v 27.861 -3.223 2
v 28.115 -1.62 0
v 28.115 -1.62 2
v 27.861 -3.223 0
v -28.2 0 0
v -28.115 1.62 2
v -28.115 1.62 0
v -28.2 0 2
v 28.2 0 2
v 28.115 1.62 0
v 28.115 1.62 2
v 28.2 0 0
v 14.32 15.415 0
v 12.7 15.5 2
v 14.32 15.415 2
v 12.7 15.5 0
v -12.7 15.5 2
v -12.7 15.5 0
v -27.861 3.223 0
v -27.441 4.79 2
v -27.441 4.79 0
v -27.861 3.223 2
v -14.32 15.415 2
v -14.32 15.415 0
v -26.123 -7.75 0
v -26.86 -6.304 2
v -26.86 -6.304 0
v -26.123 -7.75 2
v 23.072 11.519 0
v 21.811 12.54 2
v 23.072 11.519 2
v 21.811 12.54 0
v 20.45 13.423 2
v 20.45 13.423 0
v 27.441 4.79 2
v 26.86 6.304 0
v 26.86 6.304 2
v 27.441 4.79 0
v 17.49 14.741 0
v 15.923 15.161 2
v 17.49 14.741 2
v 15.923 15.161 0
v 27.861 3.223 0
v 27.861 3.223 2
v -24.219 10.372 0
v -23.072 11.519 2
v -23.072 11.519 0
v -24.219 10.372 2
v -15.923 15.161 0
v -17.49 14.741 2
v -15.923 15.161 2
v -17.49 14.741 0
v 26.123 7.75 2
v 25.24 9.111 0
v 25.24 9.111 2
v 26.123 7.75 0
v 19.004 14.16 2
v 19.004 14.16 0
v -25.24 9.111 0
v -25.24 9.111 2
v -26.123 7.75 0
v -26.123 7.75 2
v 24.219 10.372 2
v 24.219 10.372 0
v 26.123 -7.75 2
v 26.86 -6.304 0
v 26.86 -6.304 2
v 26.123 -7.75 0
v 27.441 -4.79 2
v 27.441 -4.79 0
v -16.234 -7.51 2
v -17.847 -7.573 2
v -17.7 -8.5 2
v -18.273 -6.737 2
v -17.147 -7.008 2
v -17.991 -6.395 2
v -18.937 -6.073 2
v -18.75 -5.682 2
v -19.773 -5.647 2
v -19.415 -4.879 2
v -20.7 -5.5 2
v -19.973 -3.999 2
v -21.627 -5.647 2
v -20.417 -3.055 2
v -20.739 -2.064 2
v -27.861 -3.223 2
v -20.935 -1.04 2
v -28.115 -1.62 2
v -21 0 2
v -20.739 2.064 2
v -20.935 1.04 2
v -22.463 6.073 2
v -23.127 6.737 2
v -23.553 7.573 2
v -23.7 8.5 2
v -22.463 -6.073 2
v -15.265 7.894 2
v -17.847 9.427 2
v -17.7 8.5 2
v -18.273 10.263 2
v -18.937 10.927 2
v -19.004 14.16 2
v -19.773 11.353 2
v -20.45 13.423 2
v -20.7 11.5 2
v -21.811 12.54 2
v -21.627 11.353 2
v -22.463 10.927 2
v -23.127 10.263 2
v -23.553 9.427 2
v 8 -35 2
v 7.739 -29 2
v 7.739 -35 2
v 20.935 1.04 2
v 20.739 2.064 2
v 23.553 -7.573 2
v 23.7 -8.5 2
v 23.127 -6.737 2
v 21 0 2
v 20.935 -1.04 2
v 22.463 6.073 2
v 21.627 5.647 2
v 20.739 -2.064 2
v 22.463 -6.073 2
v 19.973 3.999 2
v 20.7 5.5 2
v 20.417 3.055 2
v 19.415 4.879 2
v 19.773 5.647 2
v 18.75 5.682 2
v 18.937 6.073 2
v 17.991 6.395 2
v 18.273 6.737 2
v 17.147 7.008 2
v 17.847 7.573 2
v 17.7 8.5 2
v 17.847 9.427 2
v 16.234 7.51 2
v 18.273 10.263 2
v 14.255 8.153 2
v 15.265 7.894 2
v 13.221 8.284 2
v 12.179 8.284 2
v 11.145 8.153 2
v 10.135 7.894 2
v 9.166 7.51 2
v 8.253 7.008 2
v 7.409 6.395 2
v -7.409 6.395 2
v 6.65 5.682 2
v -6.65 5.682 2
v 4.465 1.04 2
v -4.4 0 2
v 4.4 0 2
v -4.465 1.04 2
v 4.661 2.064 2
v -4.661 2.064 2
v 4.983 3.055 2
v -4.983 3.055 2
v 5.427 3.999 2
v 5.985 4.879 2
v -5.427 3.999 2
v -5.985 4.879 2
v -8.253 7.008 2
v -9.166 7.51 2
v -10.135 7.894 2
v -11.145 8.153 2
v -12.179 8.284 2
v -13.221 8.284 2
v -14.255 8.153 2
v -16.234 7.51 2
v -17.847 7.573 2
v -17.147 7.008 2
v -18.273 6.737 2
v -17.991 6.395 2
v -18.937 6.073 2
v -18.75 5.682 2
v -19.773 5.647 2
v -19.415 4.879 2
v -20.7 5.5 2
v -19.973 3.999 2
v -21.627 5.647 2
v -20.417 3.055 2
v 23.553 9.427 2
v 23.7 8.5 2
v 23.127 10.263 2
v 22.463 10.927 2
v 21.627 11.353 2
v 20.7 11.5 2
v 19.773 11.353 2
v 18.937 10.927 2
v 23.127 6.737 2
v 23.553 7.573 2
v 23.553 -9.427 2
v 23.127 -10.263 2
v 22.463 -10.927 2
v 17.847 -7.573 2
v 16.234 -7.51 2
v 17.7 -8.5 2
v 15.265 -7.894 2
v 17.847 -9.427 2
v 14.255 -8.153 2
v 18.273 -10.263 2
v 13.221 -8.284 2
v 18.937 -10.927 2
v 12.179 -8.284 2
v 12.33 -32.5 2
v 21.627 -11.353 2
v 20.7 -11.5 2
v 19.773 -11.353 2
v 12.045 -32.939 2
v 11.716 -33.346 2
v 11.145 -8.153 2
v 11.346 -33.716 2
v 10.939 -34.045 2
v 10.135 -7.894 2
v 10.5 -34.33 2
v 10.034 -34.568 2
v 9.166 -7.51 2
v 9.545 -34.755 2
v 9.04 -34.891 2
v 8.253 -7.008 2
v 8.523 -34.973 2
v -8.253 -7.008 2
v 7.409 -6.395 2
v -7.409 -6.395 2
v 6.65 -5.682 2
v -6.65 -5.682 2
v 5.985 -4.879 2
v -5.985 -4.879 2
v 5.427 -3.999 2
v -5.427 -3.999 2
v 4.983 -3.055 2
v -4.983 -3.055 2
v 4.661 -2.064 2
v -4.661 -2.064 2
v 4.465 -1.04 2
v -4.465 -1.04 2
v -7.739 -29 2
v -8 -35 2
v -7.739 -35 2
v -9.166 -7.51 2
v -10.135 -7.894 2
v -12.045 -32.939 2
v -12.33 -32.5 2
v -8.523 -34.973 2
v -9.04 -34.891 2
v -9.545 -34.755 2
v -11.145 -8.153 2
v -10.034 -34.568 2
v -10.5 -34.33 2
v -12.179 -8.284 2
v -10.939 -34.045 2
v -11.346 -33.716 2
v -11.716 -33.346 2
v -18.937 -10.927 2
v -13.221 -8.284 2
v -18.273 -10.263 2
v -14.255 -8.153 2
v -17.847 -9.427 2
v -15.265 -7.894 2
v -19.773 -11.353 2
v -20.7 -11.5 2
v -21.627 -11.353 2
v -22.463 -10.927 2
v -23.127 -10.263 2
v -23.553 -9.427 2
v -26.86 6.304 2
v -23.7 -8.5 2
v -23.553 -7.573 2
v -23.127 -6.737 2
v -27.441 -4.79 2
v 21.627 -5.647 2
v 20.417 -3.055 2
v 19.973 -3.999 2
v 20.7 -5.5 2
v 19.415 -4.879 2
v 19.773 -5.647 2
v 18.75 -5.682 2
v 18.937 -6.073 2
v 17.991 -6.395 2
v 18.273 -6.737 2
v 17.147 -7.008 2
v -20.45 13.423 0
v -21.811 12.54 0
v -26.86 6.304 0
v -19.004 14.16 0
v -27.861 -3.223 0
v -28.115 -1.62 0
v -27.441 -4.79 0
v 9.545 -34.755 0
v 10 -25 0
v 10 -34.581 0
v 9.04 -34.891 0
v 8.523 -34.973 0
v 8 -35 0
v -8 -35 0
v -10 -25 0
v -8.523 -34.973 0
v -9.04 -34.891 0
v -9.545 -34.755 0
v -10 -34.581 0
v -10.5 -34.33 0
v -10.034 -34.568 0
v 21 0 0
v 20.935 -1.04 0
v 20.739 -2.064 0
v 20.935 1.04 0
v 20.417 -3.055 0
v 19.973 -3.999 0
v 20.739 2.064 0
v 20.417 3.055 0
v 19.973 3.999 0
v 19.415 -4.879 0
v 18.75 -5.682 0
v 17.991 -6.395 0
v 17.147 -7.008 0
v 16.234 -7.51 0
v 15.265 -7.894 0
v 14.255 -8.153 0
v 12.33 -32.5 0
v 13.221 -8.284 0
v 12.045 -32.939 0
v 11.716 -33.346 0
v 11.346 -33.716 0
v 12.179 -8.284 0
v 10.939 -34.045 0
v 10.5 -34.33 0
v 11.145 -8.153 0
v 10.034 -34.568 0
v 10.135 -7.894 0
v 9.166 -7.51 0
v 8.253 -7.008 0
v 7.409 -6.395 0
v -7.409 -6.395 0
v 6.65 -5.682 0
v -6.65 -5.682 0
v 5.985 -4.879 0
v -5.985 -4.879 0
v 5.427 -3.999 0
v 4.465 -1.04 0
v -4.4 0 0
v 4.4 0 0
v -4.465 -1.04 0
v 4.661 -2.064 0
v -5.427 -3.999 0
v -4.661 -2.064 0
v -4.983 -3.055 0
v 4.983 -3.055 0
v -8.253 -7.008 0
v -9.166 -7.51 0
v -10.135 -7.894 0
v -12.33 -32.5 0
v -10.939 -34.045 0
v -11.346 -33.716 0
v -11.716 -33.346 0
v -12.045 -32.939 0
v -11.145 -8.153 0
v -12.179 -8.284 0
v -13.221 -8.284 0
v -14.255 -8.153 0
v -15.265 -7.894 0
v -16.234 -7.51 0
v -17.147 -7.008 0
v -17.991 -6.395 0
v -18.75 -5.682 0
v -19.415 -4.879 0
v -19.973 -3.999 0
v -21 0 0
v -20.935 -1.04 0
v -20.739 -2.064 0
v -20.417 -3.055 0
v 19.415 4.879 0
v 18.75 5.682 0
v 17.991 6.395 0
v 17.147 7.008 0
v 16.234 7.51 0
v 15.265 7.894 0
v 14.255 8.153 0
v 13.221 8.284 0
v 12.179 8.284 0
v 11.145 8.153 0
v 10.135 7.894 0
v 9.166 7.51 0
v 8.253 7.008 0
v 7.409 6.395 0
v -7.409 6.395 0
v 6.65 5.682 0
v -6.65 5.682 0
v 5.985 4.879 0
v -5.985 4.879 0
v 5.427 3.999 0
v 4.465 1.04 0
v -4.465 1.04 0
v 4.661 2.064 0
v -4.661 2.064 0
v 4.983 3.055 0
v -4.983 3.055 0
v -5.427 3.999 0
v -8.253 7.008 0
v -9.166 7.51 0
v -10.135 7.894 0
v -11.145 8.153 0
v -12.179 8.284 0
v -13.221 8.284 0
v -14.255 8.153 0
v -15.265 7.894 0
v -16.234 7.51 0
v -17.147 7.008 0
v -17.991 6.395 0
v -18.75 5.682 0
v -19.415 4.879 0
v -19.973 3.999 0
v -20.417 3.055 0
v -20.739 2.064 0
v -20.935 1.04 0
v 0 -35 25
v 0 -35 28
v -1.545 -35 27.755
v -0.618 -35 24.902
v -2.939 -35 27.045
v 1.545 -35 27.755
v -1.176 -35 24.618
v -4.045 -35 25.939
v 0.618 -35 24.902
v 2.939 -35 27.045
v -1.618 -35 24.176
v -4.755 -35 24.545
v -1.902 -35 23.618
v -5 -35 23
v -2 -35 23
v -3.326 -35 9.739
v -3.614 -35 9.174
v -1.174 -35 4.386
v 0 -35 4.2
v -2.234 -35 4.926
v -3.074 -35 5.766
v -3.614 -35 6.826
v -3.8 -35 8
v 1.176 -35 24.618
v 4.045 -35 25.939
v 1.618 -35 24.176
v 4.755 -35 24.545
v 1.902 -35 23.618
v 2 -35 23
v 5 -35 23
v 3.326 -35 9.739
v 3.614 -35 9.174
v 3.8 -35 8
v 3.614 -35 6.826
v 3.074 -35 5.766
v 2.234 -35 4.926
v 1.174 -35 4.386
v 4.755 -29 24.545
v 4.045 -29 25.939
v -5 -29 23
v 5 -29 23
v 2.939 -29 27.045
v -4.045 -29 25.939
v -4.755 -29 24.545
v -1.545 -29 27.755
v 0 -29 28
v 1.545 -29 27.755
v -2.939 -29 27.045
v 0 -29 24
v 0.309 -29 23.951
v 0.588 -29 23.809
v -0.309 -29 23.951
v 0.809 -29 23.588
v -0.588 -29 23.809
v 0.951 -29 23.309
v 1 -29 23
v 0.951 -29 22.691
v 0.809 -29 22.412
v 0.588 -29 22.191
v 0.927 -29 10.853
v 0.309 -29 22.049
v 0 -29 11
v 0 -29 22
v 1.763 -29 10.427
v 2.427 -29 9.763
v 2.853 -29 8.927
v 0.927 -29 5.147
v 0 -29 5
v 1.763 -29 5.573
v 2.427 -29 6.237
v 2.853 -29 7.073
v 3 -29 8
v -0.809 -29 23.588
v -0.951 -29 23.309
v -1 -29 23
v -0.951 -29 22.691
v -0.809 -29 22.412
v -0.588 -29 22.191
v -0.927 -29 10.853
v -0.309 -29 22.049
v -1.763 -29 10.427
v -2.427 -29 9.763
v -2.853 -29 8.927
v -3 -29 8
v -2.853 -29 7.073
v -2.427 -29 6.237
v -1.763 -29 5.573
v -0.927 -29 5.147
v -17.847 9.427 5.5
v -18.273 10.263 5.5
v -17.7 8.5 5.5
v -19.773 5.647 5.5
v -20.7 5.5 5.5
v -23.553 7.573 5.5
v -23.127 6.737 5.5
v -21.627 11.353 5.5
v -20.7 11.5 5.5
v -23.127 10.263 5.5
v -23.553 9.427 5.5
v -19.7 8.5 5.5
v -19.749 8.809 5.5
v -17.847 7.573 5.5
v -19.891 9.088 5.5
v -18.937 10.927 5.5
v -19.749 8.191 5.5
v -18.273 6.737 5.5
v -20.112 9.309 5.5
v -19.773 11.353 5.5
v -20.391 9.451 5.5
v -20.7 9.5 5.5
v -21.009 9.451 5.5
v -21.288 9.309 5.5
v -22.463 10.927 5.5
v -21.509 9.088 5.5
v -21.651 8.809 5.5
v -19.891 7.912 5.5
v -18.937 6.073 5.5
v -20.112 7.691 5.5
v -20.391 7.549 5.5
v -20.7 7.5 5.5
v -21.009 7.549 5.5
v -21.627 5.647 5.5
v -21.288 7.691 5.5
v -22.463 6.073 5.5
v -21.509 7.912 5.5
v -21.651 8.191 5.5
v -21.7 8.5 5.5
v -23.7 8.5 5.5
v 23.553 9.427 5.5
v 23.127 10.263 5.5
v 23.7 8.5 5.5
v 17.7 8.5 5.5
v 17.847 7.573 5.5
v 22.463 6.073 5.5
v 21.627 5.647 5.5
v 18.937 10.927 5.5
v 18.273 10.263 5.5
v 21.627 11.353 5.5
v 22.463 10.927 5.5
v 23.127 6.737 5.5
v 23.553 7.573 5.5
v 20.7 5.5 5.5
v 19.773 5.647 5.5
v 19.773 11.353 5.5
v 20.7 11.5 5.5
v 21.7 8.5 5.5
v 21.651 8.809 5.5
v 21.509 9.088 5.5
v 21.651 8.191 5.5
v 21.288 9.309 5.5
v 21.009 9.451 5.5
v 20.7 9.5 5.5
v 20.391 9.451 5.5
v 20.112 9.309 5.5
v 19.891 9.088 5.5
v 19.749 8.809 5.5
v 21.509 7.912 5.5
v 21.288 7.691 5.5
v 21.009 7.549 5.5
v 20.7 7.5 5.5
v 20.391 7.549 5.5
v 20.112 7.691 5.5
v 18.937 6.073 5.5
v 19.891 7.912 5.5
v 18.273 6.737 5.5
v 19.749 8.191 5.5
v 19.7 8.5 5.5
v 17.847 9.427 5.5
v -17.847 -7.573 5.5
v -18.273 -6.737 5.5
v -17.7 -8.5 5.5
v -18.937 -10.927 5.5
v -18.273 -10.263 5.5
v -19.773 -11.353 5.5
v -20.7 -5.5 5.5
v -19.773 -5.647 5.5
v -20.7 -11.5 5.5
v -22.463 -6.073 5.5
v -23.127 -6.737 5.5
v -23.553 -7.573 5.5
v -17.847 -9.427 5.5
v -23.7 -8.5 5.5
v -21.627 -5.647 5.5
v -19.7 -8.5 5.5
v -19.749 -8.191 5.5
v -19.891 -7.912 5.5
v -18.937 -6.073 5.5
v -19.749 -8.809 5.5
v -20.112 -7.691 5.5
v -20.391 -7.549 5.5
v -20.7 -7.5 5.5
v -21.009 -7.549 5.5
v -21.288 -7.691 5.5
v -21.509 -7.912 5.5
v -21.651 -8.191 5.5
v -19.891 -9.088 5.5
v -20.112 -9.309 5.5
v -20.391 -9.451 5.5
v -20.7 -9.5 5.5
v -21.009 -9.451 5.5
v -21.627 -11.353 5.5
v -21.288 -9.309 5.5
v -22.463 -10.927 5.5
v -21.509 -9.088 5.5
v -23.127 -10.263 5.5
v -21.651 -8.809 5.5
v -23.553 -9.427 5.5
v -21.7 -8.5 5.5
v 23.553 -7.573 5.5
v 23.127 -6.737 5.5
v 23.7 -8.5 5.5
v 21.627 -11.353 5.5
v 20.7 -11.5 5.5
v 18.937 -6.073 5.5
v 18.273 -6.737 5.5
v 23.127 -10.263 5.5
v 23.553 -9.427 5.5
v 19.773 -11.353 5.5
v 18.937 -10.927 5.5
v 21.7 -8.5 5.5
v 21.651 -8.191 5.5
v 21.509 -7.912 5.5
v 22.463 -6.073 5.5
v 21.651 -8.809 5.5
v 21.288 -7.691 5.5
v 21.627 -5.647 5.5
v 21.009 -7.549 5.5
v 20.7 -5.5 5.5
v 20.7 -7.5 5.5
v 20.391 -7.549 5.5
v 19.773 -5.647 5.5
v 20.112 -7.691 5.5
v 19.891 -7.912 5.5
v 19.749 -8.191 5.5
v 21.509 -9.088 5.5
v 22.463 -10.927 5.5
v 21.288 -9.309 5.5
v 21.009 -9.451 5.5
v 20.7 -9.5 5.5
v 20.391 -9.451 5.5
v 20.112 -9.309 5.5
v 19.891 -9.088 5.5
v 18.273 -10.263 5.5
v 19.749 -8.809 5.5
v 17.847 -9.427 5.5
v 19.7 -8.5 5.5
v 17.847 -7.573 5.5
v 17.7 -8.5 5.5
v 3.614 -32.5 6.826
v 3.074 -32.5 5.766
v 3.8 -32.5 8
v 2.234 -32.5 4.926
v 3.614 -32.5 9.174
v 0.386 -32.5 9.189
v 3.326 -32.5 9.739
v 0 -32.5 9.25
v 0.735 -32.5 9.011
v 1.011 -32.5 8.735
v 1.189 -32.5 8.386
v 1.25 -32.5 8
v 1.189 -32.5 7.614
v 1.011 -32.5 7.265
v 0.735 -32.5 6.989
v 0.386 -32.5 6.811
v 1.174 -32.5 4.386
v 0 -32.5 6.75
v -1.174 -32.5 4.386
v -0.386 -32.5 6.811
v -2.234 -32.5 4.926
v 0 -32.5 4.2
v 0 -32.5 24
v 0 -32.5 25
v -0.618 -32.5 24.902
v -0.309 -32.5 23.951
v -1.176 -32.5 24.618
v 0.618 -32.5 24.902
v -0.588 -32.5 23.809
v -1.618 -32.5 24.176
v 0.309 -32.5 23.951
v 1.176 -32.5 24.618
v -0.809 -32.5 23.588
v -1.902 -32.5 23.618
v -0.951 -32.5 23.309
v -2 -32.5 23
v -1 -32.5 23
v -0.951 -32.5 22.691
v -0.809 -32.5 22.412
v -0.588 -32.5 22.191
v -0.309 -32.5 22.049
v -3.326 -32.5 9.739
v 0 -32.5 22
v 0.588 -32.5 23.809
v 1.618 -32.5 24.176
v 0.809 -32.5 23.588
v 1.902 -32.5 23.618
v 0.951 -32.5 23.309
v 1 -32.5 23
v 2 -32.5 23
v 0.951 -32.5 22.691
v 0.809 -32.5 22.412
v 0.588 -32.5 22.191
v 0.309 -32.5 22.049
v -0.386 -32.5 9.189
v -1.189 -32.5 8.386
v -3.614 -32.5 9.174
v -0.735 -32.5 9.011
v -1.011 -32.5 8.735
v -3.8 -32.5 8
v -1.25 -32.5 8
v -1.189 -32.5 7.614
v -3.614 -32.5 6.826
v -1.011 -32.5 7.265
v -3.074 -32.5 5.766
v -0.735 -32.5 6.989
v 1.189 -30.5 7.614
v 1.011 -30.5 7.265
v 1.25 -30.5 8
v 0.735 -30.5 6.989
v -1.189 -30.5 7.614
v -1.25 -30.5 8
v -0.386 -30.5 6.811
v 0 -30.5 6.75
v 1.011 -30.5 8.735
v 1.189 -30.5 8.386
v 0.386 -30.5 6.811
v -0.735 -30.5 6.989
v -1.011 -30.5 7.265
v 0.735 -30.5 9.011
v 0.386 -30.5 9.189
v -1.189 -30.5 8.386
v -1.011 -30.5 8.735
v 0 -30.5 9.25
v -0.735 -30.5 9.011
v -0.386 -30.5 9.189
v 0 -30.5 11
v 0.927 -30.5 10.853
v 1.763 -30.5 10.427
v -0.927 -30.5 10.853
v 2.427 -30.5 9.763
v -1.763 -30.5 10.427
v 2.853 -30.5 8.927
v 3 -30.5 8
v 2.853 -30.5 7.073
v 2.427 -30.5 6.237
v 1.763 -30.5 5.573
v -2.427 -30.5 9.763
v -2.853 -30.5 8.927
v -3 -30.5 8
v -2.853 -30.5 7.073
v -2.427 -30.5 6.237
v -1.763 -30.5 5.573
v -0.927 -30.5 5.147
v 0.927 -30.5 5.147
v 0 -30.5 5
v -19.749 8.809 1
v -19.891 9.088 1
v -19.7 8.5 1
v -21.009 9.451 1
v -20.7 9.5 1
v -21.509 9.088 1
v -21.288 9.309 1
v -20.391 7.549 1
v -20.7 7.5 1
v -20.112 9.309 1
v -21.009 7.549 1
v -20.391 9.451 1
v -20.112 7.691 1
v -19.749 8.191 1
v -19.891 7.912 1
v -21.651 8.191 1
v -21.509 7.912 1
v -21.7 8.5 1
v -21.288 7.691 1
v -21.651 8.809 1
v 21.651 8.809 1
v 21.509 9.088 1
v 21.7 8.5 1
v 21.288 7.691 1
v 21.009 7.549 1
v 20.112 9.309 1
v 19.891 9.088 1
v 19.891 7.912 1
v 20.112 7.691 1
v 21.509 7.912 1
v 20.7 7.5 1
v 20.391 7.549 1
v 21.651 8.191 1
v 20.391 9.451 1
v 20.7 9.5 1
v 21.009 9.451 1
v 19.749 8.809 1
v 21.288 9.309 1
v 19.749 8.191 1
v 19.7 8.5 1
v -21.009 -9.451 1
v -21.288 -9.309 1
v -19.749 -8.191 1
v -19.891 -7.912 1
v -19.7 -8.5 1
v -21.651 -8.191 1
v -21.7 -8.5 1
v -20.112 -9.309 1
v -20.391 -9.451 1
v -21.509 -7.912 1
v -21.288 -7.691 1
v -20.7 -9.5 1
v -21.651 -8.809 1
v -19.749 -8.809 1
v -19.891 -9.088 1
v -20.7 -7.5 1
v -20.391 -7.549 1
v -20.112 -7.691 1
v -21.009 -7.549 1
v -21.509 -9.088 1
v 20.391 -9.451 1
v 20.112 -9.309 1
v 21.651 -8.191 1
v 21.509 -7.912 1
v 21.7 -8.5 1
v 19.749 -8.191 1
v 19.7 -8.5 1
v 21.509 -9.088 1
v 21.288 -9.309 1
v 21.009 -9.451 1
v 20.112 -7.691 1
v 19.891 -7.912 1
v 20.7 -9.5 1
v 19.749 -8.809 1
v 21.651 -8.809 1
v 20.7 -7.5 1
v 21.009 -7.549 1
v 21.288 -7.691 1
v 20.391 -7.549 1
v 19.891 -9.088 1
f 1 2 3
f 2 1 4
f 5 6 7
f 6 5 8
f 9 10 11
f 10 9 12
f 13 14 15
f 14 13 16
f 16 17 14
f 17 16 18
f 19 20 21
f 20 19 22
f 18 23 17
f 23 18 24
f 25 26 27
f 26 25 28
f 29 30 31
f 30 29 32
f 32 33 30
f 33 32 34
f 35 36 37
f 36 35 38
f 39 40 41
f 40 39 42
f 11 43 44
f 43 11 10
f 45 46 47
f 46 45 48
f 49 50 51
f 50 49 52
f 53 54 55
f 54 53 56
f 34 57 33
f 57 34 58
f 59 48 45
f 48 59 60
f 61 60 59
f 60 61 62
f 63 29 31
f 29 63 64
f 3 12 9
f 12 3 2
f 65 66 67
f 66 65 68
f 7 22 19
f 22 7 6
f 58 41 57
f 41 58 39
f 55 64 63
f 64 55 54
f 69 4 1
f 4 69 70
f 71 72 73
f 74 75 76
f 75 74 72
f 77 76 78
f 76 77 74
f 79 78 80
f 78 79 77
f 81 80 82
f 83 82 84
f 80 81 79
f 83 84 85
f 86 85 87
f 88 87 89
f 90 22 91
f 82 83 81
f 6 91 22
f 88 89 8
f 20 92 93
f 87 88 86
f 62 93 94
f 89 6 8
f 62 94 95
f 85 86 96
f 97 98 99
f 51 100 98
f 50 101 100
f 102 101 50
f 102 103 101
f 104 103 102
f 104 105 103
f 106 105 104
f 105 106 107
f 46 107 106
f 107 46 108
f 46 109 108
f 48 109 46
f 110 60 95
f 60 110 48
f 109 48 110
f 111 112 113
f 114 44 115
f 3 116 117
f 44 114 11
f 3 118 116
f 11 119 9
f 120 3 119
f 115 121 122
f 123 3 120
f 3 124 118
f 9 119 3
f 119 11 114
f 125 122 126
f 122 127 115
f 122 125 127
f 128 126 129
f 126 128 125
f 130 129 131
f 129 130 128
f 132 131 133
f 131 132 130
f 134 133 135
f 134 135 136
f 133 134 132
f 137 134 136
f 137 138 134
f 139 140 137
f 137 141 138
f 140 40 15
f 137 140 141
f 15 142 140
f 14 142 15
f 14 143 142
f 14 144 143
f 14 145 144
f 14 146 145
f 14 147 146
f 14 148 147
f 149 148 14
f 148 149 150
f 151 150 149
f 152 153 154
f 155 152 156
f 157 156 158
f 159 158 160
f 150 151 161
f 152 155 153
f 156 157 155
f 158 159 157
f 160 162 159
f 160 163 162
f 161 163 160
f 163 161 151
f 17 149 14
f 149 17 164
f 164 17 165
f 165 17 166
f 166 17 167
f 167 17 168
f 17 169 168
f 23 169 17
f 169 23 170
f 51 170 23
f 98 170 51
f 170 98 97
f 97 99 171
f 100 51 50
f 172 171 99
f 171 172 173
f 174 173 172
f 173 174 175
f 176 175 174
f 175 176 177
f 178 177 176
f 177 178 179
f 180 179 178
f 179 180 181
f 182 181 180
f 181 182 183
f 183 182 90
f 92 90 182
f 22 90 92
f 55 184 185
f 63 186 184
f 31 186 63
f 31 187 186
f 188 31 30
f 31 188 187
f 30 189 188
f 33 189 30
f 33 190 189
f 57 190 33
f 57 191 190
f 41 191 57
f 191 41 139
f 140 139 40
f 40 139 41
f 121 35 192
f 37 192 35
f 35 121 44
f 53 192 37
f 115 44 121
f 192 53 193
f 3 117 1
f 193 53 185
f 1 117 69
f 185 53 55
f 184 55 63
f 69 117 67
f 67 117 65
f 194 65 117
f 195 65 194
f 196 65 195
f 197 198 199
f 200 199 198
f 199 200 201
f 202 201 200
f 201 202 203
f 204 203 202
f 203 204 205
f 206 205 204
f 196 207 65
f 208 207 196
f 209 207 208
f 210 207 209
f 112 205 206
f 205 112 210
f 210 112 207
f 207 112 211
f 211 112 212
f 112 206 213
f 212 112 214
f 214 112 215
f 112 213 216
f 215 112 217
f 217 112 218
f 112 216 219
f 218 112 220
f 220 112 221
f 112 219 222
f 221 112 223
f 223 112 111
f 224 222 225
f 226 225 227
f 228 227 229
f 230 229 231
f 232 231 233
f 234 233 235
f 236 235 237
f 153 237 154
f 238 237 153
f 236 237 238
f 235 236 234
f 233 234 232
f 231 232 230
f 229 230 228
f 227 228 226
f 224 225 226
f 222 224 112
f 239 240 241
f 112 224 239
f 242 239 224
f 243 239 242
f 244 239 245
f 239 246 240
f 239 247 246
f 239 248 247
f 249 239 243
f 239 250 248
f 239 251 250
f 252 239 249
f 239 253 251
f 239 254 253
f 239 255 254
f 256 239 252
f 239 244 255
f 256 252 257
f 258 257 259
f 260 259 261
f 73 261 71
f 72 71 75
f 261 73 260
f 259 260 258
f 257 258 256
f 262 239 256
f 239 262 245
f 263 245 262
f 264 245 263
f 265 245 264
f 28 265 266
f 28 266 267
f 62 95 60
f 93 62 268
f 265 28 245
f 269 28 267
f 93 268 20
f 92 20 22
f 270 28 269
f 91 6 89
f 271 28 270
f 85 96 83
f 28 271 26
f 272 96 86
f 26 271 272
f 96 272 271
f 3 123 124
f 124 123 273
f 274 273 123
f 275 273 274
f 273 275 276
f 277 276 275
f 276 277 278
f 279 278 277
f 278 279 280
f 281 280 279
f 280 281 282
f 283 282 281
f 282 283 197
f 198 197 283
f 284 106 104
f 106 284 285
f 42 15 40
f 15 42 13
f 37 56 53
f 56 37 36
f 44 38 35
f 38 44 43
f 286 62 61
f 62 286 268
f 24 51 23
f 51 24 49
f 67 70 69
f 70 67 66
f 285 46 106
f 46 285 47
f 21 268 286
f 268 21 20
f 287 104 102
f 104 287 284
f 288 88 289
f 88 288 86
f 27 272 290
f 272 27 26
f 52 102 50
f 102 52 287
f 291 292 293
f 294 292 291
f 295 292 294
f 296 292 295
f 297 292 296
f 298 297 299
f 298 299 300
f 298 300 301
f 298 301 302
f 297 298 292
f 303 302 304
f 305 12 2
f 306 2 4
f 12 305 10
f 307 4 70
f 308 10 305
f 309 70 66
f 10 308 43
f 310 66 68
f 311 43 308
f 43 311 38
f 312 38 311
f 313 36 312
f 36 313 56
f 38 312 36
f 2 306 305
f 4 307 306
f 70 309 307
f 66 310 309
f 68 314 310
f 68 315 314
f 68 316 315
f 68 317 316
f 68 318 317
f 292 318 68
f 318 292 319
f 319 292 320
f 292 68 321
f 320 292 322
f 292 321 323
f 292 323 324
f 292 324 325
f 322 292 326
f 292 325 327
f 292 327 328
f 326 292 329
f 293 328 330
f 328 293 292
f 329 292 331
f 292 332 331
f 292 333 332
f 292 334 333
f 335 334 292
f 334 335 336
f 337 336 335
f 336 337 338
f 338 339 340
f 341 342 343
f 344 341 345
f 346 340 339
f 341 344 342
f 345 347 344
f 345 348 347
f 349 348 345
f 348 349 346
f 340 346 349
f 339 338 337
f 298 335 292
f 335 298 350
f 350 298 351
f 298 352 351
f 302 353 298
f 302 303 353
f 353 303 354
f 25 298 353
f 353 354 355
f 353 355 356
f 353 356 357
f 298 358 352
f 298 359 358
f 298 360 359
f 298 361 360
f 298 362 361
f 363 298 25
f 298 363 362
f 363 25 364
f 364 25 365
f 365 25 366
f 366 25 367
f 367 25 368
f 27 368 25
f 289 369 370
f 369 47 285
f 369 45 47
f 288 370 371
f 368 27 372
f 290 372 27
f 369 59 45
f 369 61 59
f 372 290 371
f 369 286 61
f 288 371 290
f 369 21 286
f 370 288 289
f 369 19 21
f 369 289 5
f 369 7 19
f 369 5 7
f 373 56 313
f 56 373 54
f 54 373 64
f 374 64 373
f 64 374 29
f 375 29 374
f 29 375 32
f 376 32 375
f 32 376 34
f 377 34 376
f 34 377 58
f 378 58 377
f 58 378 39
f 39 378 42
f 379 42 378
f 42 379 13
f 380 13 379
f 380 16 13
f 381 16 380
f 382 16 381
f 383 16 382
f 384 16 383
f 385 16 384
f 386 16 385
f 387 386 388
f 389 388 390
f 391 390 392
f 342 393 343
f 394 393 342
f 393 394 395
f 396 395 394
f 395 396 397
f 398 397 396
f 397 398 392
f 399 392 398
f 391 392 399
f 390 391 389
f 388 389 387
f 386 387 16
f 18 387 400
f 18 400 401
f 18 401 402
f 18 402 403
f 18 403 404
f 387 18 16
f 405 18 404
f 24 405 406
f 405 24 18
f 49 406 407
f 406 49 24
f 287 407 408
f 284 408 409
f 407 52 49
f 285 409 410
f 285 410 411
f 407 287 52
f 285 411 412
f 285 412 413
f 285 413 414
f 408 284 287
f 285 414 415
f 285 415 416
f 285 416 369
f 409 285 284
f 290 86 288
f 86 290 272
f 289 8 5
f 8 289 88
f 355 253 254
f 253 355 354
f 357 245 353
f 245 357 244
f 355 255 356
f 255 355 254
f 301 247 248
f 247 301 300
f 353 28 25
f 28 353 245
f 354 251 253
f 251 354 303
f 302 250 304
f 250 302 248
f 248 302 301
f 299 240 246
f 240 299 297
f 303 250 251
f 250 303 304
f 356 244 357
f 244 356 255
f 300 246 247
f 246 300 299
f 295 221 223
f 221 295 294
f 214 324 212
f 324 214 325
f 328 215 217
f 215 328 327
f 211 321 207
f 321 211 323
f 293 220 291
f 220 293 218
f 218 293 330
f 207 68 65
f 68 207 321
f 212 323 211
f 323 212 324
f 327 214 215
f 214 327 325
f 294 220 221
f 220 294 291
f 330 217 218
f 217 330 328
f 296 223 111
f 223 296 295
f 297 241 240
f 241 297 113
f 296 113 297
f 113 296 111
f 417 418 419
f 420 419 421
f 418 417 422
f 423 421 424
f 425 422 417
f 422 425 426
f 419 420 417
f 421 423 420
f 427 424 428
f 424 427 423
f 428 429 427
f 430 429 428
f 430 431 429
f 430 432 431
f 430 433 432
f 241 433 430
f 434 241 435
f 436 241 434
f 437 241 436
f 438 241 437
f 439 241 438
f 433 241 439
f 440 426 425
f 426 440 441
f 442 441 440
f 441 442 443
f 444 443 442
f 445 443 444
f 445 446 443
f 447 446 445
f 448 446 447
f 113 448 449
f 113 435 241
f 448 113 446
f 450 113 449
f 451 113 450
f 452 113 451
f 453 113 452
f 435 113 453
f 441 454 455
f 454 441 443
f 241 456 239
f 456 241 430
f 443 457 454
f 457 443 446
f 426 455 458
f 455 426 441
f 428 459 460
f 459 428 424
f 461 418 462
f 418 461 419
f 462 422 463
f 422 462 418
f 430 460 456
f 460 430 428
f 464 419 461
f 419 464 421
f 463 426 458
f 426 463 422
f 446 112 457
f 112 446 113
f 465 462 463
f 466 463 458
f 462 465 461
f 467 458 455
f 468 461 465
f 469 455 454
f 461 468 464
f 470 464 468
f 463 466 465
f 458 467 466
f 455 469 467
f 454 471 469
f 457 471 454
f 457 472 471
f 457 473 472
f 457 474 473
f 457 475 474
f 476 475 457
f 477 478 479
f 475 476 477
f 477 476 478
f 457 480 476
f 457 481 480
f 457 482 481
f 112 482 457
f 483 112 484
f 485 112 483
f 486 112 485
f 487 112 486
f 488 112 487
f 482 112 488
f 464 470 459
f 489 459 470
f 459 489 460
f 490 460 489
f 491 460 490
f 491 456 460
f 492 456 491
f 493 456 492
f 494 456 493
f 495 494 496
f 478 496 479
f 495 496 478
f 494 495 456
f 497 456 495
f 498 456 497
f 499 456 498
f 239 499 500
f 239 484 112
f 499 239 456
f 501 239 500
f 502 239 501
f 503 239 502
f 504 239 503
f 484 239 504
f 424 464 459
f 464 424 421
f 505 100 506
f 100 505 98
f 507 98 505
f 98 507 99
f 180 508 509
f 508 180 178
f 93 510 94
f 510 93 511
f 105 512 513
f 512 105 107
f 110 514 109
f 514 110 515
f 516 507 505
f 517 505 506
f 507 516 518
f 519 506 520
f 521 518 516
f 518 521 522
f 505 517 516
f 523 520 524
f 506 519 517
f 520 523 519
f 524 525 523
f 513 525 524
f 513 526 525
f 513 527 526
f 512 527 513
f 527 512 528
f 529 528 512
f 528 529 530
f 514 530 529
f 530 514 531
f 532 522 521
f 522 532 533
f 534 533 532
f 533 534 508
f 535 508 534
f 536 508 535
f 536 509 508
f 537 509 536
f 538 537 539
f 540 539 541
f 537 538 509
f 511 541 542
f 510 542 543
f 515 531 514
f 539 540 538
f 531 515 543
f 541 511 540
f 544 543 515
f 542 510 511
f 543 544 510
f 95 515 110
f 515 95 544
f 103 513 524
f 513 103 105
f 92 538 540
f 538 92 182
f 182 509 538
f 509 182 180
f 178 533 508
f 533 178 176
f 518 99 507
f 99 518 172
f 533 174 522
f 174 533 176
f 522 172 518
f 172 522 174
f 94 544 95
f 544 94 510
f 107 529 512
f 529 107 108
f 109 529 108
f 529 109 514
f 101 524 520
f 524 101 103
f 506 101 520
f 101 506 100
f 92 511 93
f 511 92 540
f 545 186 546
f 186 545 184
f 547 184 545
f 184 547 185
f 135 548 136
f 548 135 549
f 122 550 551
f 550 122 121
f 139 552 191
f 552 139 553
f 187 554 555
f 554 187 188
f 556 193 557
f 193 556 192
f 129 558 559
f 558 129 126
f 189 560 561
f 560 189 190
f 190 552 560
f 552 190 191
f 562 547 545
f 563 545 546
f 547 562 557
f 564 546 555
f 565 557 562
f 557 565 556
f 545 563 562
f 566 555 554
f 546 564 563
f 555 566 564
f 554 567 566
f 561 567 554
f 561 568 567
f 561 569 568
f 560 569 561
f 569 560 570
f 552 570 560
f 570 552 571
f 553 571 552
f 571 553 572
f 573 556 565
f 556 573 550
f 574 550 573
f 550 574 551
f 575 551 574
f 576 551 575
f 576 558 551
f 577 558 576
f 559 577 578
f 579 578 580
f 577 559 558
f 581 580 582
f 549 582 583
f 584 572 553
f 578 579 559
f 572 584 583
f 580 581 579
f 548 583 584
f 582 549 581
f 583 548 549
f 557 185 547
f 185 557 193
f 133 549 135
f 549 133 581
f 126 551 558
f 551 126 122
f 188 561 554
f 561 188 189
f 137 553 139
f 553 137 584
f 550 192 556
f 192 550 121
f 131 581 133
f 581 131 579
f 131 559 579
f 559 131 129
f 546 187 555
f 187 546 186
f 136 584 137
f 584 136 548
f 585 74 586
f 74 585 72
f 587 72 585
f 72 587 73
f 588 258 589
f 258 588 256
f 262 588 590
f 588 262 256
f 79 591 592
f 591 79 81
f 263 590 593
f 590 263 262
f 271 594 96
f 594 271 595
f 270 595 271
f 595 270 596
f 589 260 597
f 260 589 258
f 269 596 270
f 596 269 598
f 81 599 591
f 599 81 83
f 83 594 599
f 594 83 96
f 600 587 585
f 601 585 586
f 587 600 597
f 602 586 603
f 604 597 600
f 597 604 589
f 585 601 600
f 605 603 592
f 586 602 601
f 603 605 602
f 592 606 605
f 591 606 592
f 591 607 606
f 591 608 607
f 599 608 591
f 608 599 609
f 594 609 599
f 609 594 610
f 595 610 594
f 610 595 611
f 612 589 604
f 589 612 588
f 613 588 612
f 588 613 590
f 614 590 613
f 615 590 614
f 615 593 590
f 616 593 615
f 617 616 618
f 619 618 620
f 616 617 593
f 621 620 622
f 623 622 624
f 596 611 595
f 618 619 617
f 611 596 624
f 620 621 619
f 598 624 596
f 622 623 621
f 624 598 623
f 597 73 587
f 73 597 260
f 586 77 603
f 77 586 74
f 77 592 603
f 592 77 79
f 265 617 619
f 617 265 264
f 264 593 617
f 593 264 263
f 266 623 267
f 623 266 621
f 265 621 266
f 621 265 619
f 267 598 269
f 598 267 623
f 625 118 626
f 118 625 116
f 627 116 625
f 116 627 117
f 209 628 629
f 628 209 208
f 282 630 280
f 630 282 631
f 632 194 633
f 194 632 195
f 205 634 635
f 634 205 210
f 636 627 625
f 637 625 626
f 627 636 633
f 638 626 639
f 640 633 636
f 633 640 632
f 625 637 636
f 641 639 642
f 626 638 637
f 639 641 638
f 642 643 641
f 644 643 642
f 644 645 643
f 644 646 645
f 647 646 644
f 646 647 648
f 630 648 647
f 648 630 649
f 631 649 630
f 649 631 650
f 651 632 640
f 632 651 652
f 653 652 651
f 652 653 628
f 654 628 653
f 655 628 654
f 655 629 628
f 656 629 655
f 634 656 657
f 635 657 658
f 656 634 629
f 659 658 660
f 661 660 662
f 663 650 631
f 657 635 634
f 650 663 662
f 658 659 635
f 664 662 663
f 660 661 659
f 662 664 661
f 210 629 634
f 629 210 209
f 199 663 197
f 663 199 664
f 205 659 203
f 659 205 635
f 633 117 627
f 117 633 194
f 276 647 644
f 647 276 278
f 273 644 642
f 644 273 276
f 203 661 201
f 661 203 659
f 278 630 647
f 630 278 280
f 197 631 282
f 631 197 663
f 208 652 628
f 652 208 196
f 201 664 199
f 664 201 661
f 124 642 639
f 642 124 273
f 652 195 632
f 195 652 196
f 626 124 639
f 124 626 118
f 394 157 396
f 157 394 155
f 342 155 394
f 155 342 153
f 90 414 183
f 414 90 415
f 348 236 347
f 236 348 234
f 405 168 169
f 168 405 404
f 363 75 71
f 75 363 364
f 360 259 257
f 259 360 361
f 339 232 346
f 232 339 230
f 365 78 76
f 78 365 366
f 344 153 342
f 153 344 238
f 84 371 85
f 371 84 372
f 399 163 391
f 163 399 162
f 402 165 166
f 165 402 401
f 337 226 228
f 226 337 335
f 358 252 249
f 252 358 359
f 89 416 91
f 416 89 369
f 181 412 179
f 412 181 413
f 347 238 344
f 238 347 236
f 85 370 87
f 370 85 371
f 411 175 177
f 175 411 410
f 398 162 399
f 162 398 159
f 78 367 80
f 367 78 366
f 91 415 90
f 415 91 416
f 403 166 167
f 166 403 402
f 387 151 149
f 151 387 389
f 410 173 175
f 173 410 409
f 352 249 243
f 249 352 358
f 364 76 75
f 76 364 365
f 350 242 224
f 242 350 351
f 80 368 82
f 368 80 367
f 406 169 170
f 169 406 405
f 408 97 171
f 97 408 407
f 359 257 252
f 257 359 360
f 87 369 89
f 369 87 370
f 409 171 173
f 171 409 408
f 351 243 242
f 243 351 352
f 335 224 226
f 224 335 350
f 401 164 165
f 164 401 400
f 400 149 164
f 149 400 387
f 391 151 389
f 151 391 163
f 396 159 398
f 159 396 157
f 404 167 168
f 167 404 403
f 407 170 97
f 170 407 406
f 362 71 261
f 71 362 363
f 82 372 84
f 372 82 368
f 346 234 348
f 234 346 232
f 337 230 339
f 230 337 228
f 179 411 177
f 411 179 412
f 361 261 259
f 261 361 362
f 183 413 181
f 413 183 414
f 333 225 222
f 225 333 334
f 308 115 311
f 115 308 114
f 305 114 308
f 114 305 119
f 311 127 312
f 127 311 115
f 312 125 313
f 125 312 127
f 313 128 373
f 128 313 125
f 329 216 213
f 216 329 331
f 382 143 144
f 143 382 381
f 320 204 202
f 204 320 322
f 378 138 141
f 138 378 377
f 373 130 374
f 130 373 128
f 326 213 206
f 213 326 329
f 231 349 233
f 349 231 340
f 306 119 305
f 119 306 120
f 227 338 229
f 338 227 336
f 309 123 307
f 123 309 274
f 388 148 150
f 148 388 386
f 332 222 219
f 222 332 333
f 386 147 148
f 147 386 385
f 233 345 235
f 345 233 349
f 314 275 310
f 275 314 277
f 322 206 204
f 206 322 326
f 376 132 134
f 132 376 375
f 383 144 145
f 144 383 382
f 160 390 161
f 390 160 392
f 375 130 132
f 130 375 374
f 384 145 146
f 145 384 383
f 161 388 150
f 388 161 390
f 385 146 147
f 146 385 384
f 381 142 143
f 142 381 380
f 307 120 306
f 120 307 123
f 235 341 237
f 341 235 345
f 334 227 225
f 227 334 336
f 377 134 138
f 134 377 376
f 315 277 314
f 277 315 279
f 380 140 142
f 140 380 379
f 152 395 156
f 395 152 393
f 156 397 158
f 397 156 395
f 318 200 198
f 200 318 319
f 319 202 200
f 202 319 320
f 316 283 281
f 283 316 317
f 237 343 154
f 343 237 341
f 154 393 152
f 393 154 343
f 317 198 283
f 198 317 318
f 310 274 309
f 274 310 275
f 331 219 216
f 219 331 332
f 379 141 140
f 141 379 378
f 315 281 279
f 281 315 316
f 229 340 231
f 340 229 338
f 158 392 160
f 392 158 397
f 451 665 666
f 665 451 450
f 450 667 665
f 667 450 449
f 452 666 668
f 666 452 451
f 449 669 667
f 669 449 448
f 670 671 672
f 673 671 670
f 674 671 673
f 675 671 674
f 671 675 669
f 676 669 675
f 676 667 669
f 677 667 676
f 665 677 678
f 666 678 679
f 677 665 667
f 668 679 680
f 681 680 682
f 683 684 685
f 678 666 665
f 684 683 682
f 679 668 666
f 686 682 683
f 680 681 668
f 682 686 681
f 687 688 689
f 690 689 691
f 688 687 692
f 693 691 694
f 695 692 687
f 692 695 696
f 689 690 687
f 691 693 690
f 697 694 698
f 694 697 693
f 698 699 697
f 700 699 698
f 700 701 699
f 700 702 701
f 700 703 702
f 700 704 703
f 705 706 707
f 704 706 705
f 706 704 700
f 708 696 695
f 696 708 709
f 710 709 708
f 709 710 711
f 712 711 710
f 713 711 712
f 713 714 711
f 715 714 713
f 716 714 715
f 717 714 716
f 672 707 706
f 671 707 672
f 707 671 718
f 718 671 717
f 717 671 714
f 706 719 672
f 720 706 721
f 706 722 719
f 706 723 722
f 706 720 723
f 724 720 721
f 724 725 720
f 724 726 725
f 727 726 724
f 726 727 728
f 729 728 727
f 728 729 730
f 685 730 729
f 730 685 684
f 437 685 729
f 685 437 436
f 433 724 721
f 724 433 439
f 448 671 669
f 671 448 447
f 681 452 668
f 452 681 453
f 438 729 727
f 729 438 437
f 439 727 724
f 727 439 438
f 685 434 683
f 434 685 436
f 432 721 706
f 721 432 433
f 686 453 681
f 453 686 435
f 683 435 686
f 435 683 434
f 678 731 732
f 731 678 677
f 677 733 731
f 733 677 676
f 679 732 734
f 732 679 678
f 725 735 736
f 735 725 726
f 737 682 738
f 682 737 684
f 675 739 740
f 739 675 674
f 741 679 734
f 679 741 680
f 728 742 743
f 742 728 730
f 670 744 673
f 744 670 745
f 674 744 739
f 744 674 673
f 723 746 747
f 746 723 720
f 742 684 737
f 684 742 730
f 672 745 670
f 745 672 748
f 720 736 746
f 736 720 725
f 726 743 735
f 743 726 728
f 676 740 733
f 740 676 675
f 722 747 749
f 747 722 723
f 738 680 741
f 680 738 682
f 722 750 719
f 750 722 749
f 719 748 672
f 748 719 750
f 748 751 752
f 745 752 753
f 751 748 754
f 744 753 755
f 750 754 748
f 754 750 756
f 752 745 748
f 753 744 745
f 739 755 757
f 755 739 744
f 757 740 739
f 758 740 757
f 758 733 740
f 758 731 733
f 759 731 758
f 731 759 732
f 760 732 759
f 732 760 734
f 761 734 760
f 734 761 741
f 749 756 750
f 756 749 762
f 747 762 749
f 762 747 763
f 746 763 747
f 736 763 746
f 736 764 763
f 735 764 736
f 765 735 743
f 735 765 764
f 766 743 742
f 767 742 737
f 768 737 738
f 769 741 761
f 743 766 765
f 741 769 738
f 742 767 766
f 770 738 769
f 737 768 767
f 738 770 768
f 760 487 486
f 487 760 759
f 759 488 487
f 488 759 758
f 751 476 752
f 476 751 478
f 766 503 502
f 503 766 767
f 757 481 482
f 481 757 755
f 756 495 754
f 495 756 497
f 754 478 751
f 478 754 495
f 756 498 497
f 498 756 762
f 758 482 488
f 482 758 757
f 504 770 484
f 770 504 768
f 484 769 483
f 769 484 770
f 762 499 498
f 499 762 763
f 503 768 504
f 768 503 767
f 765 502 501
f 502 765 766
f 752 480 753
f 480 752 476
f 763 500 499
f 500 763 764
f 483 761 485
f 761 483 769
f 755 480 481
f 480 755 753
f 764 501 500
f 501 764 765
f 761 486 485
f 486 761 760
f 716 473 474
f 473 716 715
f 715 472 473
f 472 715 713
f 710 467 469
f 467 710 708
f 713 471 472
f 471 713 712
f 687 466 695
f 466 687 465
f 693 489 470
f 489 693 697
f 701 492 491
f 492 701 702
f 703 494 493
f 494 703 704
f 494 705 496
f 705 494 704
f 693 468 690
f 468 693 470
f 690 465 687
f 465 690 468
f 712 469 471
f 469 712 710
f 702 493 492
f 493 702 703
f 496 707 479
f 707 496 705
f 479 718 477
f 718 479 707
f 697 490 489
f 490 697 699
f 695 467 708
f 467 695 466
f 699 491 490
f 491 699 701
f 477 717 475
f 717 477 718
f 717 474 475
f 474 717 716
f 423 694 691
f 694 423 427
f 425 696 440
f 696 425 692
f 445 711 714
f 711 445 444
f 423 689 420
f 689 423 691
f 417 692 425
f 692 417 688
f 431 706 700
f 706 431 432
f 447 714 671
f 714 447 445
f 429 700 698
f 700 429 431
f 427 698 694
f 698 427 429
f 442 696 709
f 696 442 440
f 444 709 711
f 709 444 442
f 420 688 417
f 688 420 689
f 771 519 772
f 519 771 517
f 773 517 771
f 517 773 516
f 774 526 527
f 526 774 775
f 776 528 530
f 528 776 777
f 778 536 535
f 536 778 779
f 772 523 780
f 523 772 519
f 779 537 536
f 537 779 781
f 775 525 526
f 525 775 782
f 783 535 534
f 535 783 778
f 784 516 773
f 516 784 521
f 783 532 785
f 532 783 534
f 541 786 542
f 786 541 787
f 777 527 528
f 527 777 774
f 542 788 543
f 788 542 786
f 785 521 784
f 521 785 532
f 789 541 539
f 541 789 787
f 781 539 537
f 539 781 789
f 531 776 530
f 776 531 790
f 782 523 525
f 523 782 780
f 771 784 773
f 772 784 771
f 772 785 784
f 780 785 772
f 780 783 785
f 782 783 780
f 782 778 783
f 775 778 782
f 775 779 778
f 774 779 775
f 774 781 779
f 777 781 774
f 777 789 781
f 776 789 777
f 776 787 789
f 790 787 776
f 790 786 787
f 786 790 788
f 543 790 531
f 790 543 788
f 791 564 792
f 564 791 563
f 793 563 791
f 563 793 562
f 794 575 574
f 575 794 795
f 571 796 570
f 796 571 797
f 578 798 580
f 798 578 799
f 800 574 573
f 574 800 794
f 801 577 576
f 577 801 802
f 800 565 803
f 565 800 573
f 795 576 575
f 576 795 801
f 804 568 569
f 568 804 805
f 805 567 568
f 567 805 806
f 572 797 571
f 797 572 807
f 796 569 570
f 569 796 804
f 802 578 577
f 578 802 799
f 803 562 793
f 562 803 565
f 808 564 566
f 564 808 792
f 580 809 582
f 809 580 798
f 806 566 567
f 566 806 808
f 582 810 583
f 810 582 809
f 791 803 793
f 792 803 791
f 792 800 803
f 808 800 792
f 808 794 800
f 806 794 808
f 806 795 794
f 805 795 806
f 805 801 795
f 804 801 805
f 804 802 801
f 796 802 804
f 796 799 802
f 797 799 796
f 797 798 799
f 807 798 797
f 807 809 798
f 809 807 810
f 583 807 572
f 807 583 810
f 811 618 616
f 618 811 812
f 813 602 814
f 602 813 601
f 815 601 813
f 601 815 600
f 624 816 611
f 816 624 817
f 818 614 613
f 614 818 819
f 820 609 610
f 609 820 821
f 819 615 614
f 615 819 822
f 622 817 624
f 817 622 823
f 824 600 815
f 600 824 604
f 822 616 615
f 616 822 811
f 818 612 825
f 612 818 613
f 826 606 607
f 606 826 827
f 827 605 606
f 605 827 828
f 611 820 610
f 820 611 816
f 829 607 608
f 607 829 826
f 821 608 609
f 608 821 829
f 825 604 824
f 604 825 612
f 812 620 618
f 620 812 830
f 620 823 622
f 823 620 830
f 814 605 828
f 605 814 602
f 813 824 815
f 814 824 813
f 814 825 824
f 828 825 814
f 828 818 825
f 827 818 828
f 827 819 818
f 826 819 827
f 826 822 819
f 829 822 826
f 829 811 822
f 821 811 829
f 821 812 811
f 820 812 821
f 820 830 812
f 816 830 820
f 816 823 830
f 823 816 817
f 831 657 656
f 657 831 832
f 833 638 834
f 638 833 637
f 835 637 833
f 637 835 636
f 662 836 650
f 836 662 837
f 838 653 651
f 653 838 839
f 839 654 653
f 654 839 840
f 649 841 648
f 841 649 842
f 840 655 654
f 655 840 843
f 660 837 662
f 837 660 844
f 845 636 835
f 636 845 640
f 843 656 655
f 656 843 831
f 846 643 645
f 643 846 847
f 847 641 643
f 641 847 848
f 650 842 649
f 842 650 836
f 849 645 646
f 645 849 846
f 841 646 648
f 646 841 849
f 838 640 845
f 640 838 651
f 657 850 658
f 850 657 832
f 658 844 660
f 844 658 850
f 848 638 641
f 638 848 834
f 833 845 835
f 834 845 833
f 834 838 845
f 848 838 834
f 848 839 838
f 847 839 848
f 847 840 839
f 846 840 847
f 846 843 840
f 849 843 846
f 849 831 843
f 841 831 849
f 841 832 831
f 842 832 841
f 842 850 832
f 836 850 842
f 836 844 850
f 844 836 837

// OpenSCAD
//Ultrasonic sensor mount.
//Parametric.
//Oktay Gülmez, 23/2/2016.
//GNU_GPL_V3


//Parameters:
//Distance between centers of transducers in mm.: 25.4mm for HC-SR04.
eyes_width=25.4;
//The diameter of the transducer in mm.: 16mm. mostly. 
eyes_diameter=16;
//Sensor PCB mounting holes in mm.: 41.4x17 for HC-SR04. 
mount_lenght=41.4;
mount_width=17;
//Desired thickness in mm.: Maximum 5mm.
thickness=2;
//Decorations: "1" smile, "2" teeth, "3" vampire, "4" mustage, "5" O, other for none.
face=1;

$fn=20;
difference(){
    union(){
 //Front plate:  
        linear_extrude(height = thickness, convexity = 10, $fn=60) hull() {
   translate([-eyes_width/2,0,0])circle(15.5);
   translate([eyes_width/2,0,0]) circle(15.5);
        }
        linear_extrude(height = thickness, convexity = 10, $fn=60) hull() {
   translate([-eyes_width/2,0,0])circle(15.5);
   translate([-8,-30,0]) circle(5);
        }
        linear_extrude(height = thickness, convexity = 10, $fn=60) hull() {
   translate([eyes_width/2,0,0])circle(15.5);
   translate([8,-30,0]) circle(5);
        }
        
       translate([-8,-35,0]) cube([16,35,thickness]);
        
//Servo mounting bracket:      
       translate([0,-35,0]) rotate([-90,-90,0]) linear_extrude(height = 6, convexity = 10) hull() {
   translate([0,0,0])circle(8);
   translate([23,0,0]) circle(5);
    }

//Sensor PCB mounting tabs:
     translate([-mount_lenght/2,mount_width/2,0]) cylinder(h=thickness+3.5, r=3);
    translate([mount_lenght/2,mount_width/2,0]) cylinder(h=thickness+3.5, r=3);
    translate([-mount_lenght/2,-mount_width/2,0]) cylinder(h=thickness+3.5, r=3);
    translate([mount_lenght/2,-mount_width/2,0]) cylinder(h=thickness+3.5, r=3);
     
}

//Transducers holes:
    translate([-eyes_width/2,0,-1]) cylinder(h=thickness+2, r=eyes_diameter/2+0.3, $fn=50);
   translate([eyes_width/2,0,-1])  cylinder(h=thickness+2, r=eyes_diameter/2+0.3, $fn=50);

//Servo head placement:   
    translate([0,-35,8]) rotate([-90,0,0]) cylinder(h=2.5, r=3.8);
    translate([0,-35-1,8]) rotate([-90,0,0]) cylinder(h=8, r=1.25);
    translate([0,-35+4.5,8]) rotate([-90,0,0]) cylinder(h=3, r=3);
    translate([0,-35-1,23]) rotate([-90,0,0]) cylinder(h=8, r=1);
    
    translate([0,-35,8]) rotate([-90,-90,0]) linear_extrude(height = 2.5, convexity = 10) hull() {
   translate([0,0,0])circle(3.5);
   translate([15,0,0]) circle(2);
    }
    
    

//Sensor PCB mounting screws holes:    
   translate([-mount_lenght/2,mount_width/2,1]) cylinder(h=thickness+3.5, r=1);
    translate([mount_lenght/2,mount_width/2,1]) cylinder(h=thickness+3.5, r=1);
    translate([-mount_lenght/2,-mount_width/2,1]) cylinder(h=thickness+3.5, r=1);
    translate([mount_lenght/2,-mount_width/2,1]) cylinder(h=thickness+3.5, r=1);
    
 //Face decoration:   
    if (face==1) {
    translate([0,0,-1]) 
          linear_extrude(height = thickness+2, convexity = 10, $fn=60)
                import(file = "ultrasonic_face_smile.dxf", layer = "0");
    }
    else if (face==2) {
        linear_extrude(height = thickness+2, convexity = 10, $fn=60)
                import(file = "ultrasonic_face_teeth.dxf", layer = "0");
    }
    else if (face==3) {
        linear_extrude(height = thickness+2, convexity = 10, $fn=60)
                import(file = "ultrasonic_face_vampire.dxf", layer = "0");
    }
    else if (face==4) {
        linear_extrude(height = thickness+2, convexity = 10, $fn=60)
                import(file = "ultrasonic_face_mustage.dxf", layer = "0");
    }
    else if (face==5) {
        linear_extrude(height = thickness+2, convexity = 10, $fn=60)
                import(file = "ultrasonic_face_O.dxf", layer = "0");
    }
    else {
    }
    
//Cleaning overhang:    
    translate([-10,-35,-10]) cube([20,10,10]);
}
